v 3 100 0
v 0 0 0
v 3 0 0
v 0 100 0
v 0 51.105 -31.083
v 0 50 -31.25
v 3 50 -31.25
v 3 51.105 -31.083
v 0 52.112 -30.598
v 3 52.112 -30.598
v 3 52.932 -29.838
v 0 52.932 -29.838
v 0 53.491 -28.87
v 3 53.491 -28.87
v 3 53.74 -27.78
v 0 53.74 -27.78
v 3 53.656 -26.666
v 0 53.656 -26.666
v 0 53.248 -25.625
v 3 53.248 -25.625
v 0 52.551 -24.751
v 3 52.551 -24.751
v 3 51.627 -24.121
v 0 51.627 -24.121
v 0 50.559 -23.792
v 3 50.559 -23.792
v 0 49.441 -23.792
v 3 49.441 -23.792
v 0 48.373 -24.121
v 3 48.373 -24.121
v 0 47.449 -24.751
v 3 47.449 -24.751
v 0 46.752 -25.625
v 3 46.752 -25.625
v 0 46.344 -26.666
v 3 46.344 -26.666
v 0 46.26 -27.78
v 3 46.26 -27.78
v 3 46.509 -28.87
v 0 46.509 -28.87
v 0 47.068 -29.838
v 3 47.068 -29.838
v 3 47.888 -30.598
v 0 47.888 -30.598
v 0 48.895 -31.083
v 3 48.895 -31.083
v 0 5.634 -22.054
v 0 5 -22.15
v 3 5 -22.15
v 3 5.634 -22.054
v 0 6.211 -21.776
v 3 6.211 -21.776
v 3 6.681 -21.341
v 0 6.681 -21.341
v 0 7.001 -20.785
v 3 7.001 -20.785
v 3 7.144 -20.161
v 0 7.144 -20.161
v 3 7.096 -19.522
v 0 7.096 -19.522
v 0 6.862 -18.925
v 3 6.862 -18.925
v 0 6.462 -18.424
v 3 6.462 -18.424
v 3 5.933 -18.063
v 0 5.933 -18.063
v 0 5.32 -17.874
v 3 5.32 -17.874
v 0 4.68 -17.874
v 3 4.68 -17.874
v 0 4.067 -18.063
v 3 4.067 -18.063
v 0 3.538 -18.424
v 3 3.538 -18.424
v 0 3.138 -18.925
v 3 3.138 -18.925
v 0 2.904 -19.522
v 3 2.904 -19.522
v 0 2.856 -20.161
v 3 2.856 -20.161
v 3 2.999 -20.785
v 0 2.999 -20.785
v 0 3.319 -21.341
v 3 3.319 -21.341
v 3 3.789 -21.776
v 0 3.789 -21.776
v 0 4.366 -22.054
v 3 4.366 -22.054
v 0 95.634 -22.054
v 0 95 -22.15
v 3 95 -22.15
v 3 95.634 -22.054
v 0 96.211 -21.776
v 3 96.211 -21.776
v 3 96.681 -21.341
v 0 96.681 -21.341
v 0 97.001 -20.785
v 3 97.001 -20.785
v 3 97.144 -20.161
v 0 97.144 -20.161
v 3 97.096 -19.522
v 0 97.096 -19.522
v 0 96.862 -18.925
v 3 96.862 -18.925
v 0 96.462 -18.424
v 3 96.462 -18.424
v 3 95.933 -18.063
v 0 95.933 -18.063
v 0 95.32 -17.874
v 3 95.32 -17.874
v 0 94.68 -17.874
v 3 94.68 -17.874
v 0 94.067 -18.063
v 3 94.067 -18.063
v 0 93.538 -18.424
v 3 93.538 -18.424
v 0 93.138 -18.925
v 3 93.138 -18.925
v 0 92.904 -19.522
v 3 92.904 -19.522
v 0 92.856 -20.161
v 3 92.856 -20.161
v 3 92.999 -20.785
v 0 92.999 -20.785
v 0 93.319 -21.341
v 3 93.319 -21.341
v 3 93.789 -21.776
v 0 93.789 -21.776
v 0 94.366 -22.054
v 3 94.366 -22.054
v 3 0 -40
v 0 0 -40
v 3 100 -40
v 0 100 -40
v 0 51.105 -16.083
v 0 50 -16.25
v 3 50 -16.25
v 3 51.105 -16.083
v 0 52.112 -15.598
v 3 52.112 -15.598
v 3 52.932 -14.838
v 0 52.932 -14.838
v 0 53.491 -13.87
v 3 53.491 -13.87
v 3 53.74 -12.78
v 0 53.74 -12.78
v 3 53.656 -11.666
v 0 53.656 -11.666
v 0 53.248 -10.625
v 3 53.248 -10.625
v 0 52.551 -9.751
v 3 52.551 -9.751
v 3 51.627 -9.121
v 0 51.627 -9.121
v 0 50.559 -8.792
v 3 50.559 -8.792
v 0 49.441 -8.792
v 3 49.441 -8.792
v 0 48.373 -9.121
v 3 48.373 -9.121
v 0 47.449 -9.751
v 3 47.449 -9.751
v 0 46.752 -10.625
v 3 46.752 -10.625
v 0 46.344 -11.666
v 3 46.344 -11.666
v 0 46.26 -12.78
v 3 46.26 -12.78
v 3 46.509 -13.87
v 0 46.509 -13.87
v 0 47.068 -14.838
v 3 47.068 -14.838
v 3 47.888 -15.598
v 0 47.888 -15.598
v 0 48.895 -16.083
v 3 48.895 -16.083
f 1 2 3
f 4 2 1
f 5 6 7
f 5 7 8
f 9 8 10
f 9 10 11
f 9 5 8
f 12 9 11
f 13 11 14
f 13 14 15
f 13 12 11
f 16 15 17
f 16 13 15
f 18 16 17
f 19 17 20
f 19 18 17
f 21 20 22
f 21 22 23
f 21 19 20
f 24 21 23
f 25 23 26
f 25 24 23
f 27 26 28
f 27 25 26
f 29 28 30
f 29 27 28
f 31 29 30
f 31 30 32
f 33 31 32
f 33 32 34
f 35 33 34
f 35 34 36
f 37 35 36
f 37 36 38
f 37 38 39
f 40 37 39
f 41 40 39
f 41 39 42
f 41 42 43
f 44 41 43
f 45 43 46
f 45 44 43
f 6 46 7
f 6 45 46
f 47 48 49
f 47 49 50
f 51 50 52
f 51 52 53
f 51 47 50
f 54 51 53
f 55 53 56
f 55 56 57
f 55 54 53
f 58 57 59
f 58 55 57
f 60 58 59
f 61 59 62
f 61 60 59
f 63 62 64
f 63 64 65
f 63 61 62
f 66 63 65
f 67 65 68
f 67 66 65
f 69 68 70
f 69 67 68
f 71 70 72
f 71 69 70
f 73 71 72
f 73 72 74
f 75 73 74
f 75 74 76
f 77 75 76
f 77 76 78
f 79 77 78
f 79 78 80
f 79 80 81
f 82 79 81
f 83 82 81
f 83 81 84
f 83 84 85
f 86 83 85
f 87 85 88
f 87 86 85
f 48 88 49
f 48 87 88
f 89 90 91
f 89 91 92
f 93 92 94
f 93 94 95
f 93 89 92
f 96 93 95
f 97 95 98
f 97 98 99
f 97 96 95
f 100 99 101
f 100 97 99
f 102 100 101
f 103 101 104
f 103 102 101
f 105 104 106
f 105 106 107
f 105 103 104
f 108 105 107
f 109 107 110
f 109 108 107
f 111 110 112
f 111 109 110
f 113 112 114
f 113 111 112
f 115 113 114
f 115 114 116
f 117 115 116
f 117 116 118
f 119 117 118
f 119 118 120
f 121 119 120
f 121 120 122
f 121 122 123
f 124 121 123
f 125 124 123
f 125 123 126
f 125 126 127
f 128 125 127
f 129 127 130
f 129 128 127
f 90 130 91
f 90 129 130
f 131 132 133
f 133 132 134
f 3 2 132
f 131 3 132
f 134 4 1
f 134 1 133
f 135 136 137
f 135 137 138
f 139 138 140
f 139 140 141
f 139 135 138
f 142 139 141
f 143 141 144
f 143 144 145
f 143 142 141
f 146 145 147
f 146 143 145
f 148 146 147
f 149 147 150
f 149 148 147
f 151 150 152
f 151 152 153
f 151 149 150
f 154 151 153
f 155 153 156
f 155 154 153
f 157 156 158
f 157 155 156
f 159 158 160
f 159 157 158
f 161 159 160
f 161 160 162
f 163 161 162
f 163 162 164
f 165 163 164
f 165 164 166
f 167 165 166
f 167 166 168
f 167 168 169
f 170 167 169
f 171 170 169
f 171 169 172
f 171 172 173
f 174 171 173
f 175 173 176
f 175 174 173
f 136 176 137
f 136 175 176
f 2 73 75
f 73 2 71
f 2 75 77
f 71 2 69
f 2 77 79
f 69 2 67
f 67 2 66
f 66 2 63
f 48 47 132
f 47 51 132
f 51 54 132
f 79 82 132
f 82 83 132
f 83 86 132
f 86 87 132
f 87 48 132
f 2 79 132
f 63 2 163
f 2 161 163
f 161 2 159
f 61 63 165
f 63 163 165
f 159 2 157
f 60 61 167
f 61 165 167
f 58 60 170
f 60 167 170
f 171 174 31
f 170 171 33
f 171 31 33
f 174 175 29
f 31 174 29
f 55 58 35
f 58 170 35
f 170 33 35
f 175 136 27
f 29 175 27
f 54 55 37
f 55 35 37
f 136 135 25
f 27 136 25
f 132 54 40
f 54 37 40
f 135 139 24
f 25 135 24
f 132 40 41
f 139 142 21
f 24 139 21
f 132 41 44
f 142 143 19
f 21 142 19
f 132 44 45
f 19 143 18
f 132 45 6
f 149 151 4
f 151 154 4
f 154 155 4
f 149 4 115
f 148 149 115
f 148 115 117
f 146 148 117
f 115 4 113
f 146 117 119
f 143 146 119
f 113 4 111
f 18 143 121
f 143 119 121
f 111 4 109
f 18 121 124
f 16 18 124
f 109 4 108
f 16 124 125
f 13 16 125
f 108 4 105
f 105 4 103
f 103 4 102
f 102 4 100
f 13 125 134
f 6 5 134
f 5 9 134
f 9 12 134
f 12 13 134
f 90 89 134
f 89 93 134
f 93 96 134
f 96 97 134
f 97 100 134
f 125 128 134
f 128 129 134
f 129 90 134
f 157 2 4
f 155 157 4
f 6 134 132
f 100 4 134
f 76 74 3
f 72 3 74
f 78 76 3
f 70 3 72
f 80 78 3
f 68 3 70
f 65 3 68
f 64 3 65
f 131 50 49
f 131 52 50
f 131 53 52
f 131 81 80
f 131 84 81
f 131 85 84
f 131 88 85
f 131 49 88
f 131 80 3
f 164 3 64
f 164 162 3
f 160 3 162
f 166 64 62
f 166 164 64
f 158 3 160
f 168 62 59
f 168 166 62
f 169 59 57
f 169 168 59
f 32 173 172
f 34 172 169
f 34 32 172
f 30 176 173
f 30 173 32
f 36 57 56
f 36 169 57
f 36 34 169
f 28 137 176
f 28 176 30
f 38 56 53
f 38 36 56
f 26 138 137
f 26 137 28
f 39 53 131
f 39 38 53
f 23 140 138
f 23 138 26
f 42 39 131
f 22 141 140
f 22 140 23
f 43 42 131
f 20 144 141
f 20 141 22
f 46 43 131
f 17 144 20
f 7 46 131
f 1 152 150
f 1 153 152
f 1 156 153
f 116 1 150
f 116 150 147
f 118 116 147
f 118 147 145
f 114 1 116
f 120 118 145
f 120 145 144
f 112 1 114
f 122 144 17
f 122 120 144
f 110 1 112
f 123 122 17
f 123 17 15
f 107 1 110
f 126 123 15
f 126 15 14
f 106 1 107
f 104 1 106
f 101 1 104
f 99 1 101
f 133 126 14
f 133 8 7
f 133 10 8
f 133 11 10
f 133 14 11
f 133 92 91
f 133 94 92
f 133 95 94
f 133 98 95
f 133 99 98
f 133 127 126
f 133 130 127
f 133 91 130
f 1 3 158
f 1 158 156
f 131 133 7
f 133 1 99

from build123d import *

# Parameters (mm, degrees)
SKETCH1_W           = 40
SKETCH1_H           = 100
SKETCH1_R           = 2.15
SKETCH1_R_2         = 3.75
BOSS_EXTRUDE2_DEPTH = 3


with BuildPart() as part:
    # Sketch1 → Boss-Extrude2 (new body)
    with BuildSketch(Plane(origin=(0, 0, 0), x_dir=(0, 0, -1), z_dir=(1, 0, 0))):
        with Locations((20, 50)):
            Rectangle(SKETCH1_W, SKETCH1_H)
        with Locations((20, 95)):
            Circle(SKETCH1_R, mode=Mode.SUBTRACT)
        with Locations((20, 5)):
            Circle(SKETCH1_R, mode=Mode.SUBTRACT)
        with Locations((12.5, 50)):
            Circle(SKETCH1_R_2, mode=Mode.SUBTRACT)
        with Locations((27.5, 50)):
            Circle(SKETCH1_R_2, mode=Mode.SUBTRACT)
    extrude(amount=BOSS_EXTRUDE2_DEPTH)


solid = part.part
